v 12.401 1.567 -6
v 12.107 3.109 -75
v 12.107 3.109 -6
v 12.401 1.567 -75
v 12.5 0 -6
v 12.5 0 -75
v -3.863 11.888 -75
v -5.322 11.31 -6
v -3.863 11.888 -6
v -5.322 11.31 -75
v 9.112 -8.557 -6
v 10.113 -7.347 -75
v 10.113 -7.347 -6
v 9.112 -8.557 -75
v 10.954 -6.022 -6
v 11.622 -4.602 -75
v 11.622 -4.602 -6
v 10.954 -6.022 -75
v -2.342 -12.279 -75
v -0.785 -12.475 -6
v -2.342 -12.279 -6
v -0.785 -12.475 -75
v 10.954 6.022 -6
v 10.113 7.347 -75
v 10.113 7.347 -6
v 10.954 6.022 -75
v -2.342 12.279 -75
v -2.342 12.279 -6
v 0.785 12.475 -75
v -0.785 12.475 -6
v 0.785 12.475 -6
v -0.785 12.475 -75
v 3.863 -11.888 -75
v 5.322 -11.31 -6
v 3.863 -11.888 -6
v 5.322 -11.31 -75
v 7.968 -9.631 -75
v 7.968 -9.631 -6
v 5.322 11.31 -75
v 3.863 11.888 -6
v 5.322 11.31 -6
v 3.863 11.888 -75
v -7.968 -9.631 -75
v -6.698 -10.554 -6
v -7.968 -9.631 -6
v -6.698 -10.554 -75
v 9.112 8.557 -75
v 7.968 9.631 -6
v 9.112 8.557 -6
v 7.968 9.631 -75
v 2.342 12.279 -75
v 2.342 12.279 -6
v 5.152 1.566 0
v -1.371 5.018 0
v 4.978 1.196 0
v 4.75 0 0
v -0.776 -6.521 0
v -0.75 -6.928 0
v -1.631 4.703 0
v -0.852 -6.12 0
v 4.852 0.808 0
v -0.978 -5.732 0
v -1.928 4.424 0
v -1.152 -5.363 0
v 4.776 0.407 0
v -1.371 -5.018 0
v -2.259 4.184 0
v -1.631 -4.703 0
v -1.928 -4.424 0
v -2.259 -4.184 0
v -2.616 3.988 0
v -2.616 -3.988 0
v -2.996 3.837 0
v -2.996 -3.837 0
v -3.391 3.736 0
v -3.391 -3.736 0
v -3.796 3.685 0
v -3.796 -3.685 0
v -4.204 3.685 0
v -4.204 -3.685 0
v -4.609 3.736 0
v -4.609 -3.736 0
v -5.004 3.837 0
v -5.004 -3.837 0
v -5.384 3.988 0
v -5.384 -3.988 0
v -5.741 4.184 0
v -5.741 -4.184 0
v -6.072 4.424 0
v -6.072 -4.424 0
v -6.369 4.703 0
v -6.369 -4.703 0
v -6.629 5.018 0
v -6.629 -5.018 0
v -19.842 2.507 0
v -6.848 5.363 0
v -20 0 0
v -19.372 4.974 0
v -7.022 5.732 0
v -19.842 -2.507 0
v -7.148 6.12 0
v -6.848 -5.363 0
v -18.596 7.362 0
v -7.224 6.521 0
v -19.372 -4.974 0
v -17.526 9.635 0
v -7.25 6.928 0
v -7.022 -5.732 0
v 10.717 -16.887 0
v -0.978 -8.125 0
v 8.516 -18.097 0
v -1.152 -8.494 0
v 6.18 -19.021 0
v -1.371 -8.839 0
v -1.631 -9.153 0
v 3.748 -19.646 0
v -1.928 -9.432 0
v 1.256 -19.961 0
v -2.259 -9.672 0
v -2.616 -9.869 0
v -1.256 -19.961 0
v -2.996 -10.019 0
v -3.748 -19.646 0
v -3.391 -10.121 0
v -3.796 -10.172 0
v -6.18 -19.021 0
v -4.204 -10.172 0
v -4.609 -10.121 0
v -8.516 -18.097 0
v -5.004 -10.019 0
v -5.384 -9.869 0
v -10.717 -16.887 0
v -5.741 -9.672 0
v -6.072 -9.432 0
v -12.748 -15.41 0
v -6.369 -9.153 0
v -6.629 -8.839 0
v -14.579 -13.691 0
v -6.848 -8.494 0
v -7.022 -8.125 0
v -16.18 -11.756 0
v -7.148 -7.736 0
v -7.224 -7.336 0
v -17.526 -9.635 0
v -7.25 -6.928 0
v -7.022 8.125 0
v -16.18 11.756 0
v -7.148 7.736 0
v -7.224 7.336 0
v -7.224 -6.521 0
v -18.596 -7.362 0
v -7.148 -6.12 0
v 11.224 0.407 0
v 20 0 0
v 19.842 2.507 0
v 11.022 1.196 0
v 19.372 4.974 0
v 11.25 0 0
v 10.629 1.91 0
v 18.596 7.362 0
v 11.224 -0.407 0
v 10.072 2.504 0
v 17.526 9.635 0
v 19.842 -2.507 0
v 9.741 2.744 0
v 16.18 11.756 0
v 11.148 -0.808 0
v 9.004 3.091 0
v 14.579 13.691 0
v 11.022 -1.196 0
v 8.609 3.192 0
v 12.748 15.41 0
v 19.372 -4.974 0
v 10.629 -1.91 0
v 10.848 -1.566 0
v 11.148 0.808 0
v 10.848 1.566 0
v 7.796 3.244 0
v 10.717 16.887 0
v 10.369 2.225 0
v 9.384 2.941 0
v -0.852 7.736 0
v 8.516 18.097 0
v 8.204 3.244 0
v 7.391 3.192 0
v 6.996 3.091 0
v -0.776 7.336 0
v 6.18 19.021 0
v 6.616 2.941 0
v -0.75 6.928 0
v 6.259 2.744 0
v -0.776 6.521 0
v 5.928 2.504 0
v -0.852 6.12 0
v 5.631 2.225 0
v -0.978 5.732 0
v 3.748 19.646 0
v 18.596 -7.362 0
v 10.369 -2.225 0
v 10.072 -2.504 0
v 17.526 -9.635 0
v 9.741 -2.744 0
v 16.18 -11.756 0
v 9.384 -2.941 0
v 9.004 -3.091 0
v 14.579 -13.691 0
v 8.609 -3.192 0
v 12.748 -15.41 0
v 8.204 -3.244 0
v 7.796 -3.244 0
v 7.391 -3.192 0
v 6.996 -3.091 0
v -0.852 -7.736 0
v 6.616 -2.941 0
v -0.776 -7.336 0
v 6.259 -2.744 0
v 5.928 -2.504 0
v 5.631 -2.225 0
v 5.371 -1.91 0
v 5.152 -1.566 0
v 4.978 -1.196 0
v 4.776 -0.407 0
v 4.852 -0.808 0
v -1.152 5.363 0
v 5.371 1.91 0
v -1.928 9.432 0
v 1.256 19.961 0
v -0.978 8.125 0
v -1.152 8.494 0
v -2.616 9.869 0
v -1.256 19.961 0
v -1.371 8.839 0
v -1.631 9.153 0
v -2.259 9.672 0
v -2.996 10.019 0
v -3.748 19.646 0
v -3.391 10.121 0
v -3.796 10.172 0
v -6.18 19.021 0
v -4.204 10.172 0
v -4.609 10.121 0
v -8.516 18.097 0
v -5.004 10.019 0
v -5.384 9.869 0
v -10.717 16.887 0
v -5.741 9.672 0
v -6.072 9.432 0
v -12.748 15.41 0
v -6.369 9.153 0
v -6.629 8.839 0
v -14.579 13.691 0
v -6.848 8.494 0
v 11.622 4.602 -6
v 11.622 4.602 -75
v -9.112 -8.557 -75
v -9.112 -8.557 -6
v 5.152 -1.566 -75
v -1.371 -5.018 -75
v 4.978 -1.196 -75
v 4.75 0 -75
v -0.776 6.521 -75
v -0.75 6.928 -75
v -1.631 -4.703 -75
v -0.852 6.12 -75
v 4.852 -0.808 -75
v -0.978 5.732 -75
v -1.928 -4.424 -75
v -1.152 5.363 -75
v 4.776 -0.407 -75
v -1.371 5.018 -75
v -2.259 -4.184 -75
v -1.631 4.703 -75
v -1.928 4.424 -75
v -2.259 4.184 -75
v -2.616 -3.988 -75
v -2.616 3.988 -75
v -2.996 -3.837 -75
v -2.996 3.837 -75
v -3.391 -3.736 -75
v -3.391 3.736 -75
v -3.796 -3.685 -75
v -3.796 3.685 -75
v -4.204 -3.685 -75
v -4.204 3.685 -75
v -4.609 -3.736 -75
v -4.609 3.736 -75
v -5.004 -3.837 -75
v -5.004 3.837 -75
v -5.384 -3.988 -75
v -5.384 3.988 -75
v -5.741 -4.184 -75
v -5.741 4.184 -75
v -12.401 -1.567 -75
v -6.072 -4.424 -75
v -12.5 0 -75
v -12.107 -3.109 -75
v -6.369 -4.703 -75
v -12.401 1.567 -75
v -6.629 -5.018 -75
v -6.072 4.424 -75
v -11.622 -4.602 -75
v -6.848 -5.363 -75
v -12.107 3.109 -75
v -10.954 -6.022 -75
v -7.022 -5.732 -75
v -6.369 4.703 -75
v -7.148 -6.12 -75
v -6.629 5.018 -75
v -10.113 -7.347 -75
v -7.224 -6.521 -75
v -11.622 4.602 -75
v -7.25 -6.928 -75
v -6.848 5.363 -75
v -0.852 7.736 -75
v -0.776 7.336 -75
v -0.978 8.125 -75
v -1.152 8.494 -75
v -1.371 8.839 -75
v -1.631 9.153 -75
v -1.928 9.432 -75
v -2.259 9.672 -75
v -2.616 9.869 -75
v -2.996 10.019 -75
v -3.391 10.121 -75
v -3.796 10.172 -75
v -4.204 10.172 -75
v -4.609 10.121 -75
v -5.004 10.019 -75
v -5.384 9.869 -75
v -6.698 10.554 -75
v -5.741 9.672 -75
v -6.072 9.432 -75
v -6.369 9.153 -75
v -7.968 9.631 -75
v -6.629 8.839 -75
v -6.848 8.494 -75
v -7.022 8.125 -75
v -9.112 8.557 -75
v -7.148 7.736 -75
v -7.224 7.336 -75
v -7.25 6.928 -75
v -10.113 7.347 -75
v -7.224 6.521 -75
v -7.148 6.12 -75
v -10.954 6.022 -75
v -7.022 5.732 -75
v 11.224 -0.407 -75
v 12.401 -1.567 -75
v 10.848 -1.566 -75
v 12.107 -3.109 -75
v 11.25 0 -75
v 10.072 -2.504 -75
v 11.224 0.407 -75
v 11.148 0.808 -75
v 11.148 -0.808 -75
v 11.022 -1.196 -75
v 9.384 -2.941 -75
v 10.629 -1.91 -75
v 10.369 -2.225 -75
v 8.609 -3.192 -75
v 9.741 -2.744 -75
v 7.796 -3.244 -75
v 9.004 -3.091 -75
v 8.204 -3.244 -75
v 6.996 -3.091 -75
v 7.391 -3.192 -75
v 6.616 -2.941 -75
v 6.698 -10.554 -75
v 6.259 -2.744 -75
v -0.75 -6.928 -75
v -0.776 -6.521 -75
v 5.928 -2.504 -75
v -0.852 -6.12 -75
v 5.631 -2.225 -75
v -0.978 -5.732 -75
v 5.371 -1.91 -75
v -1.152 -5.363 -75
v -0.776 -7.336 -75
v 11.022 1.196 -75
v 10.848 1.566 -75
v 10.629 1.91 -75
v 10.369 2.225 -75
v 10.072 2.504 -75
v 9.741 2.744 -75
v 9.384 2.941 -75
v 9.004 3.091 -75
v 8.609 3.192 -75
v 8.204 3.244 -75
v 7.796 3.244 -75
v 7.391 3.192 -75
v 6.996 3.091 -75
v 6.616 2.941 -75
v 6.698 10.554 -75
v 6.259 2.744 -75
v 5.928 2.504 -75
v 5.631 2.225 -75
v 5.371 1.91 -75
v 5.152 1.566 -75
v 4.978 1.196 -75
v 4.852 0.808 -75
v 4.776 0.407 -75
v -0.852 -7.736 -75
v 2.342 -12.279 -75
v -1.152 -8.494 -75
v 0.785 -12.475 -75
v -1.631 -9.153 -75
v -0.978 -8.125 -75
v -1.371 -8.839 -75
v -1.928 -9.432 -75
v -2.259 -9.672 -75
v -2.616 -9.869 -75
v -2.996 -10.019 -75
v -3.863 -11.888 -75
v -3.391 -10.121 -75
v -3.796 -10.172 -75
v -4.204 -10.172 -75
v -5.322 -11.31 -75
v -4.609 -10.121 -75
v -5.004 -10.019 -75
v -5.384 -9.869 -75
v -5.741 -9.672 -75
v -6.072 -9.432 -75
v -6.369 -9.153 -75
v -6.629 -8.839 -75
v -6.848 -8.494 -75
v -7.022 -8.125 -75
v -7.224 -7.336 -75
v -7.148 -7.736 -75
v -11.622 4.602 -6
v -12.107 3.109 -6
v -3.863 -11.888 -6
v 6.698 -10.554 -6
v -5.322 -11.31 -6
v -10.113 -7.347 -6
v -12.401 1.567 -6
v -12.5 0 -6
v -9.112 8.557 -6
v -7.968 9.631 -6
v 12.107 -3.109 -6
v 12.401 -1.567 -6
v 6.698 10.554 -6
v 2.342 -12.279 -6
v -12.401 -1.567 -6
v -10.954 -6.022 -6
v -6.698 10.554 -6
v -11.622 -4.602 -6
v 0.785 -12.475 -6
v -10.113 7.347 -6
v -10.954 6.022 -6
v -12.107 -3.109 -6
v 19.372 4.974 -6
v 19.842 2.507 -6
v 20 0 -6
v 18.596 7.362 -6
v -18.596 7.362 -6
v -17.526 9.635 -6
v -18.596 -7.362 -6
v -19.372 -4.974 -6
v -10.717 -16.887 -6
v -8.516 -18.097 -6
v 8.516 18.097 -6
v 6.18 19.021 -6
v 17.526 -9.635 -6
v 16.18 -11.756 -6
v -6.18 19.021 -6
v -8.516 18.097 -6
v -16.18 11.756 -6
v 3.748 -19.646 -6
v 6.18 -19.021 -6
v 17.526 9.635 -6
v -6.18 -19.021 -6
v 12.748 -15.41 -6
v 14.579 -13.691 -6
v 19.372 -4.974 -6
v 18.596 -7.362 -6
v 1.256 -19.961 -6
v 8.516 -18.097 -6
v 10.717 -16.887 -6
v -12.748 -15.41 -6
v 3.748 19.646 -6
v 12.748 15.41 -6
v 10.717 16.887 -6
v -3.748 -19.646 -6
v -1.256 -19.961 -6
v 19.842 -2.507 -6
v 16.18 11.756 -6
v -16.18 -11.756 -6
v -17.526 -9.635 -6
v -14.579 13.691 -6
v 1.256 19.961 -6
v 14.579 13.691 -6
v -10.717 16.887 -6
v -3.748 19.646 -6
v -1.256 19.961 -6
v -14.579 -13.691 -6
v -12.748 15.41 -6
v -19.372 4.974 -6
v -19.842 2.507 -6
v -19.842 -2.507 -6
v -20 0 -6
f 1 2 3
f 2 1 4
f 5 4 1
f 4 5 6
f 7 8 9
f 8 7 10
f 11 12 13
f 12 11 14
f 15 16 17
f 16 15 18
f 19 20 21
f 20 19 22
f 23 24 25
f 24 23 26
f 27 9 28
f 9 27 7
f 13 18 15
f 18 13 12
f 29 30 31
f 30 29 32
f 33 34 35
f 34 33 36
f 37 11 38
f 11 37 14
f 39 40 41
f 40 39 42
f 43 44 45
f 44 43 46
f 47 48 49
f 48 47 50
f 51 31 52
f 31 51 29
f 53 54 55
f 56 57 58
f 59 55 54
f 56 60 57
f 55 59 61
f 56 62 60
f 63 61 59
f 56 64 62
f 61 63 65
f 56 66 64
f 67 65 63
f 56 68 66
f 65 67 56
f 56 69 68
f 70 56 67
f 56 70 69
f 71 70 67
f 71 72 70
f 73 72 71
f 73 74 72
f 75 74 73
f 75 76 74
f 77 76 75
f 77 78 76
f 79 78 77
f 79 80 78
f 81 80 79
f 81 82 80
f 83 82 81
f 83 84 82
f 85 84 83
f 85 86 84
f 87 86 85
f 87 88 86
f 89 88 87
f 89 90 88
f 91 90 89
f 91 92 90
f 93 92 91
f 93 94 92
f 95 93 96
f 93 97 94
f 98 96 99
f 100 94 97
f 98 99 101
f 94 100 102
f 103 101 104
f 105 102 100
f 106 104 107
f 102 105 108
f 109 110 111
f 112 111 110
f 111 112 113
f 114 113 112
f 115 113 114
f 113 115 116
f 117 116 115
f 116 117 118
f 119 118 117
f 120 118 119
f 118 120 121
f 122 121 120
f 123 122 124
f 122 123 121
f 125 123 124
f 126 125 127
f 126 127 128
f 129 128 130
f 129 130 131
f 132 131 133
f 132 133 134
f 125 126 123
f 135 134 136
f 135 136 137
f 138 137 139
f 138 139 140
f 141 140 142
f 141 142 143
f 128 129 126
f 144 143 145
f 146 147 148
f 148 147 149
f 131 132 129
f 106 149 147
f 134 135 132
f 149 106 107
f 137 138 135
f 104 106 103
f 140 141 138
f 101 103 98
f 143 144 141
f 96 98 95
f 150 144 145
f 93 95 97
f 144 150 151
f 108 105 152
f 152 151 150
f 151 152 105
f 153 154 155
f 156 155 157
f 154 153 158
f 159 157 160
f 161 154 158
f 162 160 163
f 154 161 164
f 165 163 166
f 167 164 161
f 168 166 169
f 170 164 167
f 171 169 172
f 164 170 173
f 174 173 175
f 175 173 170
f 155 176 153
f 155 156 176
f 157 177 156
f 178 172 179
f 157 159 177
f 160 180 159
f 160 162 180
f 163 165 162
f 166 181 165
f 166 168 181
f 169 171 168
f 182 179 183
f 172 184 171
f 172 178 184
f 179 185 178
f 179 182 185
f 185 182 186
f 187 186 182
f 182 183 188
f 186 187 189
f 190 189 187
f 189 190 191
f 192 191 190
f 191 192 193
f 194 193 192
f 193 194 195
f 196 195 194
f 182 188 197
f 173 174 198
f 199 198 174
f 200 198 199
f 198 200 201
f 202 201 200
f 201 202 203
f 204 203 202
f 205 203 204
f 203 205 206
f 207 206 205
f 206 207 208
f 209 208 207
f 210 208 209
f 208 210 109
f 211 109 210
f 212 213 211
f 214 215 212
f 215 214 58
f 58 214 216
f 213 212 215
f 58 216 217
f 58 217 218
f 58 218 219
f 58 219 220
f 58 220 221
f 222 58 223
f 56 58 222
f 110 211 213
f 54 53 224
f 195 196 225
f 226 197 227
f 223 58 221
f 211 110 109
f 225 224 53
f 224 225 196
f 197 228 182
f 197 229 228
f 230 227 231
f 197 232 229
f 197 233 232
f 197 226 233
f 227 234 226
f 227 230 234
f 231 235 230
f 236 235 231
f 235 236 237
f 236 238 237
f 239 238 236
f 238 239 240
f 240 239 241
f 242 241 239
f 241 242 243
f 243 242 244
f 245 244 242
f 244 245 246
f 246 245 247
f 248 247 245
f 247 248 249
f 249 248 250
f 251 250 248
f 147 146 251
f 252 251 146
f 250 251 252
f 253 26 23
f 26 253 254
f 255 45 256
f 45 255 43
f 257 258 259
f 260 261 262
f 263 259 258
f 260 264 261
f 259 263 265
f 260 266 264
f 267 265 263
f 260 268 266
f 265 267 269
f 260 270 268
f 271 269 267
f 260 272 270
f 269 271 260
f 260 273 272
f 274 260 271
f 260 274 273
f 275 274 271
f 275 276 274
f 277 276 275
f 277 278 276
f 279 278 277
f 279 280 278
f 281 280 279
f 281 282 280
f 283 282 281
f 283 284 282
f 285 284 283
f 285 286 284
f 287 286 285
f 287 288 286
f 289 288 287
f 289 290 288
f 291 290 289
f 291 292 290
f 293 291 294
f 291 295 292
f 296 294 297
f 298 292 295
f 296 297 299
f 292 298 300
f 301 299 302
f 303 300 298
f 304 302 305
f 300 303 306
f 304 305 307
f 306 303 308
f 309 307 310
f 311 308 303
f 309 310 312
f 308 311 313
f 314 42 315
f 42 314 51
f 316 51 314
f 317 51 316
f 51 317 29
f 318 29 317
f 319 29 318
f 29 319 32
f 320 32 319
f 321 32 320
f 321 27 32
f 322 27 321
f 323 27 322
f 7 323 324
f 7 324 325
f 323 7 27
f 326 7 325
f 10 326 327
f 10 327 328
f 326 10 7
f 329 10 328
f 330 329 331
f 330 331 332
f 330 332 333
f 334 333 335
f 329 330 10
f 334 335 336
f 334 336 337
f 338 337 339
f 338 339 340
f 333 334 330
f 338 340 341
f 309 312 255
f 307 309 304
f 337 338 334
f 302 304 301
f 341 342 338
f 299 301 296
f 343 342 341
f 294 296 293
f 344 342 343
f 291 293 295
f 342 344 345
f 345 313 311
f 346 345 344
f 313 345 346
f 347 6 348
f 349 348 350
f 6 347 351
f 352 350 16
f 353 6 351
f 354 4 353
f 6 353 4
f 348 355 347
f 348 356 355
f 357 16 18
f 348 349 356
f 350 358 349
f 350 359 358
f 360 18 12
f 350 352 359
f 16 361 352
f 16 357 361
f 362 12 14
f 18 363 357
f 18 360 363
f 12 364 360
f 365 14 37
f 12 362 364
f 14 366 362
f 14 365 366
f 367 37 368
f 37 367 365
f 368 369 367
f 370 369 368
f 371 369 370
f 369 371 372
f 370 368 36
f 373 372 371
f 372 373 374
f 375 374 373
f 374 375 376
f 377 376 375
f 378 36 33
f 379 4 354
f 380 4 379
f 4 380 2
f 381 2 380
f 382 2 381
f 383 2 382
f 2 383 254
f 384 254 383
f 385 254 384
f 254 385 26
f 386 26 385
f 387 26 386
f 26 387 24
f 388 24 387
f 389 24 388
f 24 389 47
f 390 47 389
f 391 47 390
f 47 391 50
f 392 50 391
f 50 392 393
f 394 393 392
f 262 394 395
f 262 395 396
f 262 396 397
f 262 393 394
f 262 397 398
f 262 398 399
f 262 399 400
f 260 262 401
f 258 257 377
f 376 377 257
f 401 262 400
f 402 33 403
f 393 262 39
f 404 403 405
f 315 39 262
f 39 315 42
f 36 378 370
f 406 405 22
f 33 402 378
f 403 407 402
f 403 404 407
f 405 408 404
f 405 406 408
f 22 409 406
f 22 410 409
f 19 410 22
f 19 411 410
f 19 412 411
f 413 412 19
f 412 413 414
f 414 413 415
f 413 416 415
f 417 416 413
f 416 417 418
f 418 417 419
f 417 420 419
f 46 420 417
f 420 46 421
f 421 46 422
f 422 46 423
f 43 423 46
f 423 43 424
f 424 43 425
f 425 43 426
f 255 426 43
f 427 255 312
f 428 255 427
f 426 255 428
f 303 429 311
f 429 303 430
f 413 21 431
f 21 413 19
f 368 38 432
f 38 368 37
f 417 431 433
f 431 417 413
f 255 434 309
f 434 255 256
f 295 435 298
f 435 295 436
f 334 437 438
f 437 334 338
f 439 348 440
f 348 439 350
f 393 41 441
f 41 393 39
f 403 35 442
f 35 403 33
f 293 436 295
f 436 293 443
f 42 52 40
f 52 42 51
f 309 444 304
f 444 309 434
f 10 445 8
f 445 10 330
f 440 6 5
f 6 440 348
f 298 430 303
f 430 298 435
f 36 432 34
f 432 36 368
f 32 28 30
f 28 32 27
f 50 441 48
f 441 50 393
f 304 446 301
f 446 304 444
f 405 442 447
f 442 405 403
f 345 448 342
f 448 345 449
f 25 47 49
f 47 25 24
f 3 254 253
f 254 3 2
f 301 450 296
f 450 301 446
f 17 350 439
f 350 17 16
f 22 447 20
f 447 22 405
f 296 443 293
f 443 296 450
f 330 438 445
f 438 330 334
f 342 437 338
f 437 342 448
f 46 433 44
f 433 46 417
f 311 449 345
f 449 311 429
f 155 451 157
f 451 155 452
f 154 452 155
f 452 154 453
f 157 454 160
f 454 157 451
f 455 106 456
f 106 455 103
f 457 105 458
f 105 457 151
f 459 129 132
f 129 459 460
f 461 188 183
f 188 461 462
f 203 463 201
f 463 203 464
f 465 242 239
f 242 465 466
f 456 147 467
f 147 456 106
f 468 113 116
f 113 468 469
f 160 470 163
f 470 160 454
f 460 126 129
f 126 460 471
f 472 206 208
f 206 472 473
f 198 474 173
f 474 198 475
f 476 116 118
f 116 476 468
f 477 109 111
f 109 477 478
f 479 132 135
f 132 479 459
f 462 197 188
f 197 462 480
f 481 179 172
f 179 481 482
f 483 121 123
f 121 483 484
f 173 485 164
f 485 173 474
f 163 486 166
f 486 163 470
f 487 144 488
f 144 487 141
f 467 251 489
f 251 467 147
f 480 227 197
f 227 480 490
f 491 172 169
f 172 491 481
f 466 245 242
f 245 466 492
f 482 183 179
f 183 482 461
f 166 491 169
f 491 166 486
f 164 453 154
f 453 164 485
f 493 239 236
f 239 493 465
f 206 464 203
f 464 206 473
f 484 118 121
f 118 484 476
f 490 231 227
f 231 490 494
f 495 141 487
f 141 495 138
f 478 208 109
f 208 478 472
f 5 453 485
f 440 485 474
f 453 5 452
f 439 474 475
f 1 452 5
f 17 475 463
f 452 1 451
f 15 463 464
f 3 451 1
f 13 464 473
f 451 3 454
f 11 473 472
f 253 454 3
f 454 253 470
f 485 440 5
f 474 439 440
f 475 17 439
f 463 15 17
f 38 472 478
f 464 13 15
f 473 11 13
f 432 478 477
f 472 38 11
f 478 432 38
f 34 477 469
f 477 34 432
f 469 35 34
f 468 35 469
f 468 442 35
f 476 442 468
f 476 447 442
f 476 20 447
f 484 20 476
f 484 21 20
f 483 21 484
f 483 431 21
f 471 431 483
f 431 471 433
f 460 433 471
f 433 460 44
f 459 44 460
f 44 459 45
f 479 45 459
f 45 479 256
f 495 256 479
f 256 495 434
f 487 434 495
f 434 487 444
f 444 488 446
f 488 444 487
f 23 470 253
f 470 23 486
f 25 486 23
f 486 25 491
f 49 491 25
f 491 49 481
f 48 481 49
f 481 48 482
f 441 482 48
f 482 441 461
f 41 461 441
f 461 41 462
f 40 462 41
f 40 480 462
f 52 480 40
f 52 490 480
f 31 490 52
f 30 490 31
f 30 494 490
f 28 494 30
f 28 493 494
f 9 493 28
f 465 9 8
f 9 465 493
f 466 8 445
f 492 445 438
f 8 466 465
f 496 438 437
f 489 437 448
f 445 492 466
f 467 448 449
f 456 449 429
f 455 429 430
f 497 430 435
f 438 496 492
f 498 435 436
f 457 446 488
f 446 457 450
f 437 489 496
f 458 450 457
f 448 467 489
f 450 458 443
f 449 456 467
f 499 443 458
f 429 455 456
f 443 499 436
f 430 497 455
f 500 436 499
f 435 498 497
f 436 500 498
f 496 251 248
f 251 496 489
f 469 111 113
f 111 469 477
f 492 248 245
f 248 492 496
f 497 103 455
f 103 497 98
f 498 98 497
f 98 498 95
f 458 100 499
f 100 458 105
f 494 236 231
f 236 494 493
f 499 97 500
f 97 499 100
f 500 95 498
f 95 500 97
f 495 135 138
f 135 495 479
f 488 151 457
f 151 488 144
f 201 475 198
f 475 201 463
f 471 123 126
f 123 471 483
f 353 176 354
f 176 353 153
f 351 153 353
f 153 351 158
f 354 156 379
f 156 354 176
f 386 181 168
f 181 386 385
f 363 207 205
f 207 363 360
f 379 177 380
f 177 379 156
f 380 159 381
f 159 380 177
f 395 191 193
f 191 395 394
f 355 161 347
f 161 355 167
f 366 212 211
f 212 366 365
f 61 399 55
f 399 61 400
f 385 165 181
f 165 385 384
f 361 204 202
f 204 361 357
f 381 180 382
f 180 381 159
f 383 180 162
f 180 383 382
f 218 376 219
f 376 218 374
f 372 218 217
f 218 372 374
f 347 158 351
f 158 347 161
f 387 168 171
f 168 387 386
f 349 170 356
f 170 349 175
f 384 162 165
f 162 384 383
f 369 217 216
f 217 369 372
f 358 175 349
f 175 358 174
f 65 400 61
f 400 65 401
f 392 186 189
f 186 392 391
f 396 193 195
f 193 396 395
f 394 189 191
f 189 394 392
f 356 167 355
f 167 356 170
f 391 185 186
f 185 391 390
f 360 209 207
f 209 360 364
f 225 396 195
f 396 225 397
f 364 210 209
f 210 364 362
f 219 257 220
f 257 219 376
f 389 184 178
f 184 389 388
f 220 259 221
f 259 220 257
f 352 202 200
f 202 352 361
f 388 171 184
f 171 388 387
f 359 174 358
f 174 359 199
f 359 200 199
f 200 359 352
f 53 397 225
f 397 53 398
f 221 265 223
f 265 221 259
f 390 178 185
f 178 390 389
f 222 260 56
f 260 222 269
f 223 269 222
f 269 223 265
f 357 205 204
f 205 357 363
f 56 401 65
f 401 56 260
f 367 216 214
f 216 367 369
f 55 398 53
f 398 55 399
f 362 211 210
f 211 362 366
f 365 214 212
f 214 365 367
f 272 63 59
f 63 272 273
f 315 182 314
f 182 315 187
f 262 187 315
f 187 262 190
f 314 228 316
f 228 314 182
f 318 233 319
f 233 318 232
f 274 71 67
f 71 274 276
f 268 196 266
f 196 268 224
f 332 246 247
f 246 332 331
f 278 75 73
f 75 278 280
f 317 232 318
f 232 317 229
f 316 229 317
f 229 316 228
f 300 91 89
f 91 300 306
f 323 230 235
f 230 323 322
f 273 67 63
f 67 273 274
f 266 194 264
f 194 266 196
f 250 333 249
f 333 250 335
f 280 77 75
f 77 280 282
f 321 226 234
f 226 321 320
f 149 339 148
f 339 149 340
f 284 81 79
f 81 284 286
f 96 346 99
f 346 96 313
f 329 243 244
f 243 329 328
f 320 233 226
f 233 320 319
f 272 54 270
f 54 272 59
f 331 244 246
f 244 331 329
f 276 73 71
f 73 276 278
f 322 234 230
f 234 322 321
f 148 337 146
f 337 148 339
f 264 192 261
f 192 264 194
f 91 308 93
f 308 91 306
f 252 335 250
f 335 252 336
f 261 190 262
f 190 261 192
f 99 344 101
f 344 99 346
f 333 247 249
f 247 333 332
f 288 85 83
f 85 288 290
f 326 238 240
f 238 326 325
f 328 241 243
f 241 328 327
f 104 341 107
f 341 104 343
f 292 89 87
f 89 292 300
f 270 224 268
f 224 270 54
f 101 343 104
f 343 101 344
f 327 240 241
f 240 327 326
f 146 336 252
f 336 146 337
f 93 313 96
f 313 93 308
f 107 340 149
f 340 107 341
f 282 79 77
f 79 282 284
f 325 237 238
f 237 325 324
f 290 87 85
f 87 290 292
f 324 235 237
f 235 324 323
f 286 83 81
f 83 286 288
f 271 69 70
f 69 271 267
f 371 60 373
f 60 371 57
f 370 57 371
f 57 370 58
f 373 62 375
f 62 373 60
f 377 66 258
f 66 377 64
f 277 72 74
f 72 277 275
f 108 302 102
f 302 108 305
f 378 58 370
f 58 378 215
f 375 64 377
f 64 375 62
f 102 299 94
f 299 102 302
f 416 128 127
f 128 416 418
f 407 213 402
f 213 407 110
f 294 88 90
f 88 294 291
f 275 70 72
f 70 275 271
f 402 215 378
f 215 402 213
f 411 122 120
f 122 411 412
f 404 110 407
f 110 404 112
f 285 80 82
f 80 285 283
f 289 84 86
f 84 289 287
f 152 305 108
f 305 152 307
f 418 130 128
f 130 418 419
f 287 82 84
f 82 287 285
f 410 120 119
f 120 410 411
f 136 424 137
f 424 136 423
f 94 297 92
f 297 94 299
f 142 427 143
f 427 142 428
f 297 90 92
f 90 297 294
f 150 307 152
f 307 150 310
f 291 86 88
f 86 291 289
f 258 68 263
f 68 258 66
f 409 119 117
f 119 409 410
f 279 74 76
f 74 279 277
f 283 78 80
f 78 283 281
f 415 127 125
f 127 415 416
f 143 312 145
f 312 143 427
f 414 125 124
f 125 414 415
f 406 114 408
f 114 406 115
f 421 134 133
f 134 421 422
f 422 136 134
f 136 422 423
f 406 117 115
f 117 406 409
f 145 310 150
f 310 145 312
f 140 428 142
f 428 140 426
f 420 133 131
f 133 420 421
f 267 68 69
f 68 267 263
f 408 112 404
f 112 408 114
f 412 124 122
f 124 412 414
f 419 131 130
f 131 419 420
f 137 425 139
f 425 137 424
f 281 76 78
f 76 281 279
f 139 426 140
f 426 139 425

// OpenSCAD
$fn = 50;


difference() {
	union() {
		translate(v = [0, 0, -75.0000000000]) {
			cylinder(h = 75, r = 12.5000000000);
		}
		translate(v = [0, 0, -6.0000000000]) {
			cylinder(h = 6, r = 20.0000000000);
		}
	}
	union() {
		#translate(v = [8.0000000000, 0.0000000000, -75]) {
			cylinder(h = 75, r = 3.2500000000);
		}
		#translate(v = [-4.0000000000, 6.9282032303, -75]) {
			cylinder(h = 75, r = 3.2500000000);
		}
		#translate(v = [-4.0000000000, -6.9282032303, -75]) {
			cylinder(h = 75, r = 3.2500000000);
		}
	}
}
